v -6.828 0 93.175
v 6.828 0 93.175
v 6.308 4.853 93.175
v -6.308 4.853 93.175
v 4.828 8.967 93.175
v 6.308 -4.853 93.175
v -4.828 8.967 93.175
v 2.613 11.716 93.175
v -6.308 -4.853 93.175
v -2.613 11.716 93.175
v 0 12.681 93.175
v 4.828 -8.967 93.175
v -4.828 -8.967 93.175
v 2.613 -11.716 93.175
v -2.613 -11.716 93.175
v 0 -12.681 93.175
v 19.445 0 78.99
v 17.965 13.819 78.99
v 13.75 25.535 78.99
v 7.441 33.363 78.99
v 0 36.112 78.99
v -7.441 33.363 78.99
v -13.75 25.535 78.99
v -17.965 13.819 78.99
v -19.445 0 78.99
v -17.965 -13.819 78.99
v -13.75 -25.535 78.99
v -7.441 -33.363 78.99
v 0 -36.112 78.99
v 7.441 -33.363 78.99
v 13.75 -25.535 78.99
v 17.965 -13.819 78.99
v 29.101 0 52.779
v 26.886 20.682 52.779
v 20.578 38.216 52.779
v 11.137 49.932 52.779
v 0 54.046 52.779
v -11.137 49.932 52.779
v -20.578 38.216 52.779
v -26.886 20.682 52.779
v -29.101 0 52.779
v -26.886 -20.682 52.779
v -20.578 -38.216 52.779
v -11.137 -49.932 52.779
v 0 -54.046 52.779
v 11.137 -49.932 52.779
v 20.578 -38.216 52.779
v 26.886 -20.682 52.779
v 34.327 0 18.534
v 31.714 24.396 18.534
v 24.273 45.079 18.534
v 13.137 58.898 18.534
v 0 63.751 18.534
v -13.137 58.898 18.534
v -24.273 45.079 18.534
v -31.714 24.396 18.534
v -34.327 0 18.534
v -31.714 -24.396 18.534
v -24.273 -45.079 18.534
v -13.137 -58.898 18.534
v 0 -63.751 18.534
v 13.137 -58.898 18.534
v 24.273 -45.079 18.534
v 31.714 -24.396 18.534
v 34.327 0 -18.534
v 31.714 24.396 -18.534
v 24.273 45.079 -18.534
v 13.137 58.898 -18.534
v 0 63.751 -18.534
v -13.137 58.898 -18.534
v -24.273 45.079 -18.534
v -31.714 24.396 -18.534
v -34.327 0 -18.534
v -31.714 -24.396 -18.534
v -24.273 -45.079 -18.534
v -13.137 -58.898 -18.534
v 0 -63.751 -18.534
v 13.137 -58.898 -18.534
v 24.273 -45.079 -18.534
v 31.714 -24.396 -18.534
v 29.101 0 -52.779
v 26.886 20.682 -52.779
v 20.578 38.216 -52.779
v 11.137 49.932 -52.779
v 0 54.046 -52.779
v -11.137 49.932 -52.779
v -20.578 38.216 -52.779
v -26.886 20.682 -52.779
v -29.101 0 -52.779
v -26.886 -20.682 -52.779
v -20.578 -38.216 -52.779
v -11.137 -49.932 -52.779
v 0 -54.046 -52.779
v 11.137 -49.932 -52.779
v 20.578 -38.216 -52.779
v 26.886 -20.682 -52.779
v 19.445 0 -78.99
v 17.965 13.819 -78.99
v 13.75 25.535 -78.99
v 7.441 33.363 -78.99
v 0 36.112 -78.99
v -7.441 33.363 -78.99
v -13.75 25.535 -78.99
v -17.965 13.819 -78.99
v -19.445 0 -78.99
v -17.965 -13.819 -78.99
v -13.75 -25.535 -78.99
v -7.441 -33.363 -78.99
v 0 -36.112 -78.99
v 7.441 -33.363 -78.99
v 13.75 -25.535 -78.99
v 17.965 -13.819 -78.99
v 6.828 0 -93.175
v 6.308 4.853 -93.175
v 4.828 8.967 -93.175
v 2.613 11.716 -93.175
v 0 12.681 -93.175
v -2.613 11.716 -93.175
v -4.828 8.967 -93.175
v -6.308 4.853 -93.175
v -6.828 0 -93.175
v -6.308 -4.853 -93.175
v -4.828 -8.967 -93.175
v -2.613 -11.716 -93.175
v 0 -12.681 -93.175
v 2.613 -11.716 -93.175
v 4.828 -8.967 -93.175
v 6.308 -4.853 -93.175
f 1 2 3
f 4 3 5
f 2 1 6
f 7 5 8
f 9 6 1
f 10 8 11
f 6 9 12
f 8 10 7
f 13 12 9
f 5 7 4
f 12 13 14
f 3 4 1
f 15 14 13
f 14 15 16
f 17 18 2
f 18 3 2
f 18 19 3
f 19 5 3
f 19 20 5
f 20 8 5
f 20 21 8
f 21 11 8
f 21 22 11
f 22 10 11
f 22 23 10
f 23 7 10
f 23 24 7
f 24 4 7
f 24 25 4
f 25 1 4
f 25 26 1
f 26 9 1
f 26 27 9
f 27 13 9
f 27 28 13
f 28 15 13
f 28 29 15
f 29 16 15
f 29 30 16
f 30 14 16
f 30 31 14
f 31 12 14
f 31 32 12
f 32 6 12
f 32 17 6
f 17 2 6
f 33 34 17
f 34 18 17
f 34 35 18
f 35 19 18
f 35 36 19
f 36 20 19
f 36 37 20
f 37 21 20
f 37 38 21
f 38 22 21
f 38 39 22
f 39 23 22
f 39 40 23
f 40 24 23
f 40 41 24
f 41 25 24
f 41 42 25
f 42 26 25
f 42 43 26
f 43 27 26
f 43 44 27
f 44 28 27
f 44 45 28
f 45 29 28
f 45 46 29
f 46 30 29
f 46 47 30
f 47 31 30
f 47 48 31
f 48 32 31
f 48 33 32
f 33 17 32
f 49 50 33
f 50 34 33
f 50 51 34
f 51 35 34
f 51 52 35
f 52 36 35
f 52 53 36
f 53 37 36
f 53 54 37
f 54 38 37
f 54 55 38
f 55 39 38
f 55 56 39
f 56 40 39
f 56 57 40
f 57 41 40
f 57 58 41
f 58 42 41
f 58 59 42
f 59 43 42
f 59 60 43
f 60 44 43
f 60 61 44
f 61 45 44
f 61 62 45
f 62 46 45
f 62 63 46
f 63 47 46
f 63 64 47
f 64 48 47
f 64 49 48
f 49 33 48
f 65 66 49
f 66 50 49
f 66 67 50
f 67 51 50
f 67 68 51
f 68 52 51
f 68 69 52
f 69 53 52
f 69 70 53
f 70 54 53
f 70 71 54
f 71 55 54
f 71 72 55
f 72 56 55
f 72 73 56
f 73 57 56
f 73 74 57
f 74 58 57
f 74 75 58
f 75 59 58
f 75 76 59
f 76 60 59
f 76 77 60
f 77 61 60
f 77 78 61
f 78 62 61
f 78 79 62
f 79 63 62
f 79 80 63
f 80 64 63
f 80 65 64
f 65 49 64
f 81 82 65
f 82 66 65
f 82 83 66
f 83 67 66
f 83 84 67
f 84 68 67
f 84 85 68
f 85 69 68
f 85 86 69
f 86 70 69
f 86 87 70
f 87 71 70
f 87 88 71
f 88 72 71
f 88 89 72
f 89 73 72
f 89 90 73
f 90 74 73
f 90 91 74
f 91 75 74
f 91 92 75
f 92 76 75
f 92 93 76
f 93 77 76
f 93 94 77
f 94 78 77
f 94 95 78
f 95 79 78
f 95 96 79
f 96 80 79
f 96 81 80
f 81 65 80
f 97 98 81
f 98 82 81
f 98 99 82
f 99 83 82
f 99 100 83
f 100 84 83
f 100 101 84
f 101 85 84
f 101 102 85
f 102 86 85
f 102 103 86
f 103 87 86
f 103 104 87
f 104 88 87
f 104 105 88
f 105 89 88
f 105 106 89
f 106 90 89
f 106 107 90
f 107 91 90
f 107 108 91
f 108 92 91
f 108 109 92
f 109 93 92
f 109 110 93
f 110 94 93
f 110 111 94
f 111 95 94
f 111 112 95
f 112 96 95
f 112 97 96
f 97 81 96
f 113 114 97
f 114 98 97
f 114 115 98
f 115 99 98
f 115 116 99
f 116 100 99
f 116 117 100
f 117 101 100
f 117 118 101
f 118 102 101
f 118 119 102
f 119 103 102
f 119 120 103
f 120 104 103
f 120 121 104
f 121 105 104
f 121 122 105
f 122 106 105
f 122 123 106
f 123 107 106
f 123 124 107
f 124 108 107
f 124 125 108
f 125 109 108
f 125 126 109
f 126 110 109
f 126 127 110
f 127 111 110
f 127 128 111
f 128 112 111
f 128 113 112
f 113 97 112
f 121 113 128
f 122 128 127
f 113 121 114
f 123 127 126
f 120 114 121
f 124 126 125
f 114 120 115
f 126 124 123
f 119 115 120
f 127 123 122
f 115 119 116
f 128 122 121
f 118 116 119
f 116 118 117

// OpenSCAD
// Generated by SolidPython 1.0.1 on 2020-07-29 00:46:47


scale(v = [7, 13, 19]) {
	sphere(r = 5);
}
/***********************************************
*********      SolidPython code:      **********
************************************************
 
# import packages: SolidPython
from solid import *
from solid.utils import *
from itertools import chain, combinations, permutations


class Resize:

    def __init__(self, scad_file):
        self.scad_file = scad_file
        #self.scad_file = import_scad(scad_file)
        # cone/cylinder param:
        self.r1 = 0
        self.r2 = 0
        self.h = 0
        # rectangular prism param:
        self.w = 0
        self.l = 0
        # ellipse param:
        self.r = 0

    # import OpenScad code (file name corresponds to shape)


    # classify shape + parameters
    def assign(self, param1, param2, param3):
        if self.scad_file == 'cone.scad':
            self.r1 = param1
            self.r2 = param2
            self.h = param3
        elif self.scad_file == 'cylinder.scad':
            self.r1 = param1
            self.r2 = param2
            self.h = param3
        elif self.scad_file == 'rectangularPrism.scad':
            self.h = param1
            self.l = param2
            self.w = param3
        else:
            self.r = param1
            self.h = param2

    # resize parameters
    def iterate(self):
        x = range(3, 20, 2)
        i = 1
        if self.scad_file == 'cone.scad':
            tempList = list(permutations(x, 2))
            for temp in tempList:
                param1 = temp[0]
                param2 = temp[1]
                filepath = 'produced_scad_files/' + 'cone' + str(param1) + '_' + str(param2) + '_' + '.scad'
                scad_render_to_file(cylinder(h=param1, r1=param2, r2=0), filepath)

        elif self.scad_file == 'cylinder.scad':
            tempList = list(permutations(x, 3))
            for temp in tempList:
                param1 = temp[0]
                param2 = temp[1]
                filepath = 'produced_scad_files/' + 'cylinder' + str(param1) + '_' + str(param2) + '_' + '.scad'
                scad_render_to_file(cylinder(h=param1, r1=param2, r2=param2), filepath)

        elif self.scad_file == 'rectangularPrism.scad':
            tempList = list(permutations(x, 3))
            for temp in tempList:
                param1 = temp[0]
                param2 = temp[1]
                param3 = temp[2]
                filepath = 'produced_scad_files/' + 'rectangularPrism' + str(param1) + '_' + str(param2) + '_' + str(
                    param3) + '.scad'
                scad_render_to_file(cube(size=(param1, param2, param3)), filepath)

        elif self.scad_file == 'ellipse.scad':
            tempList = list(permutations(x, 4))
            for temp in tempList:
                param1 = temp[0]
                param2 = temp[1]
                param3 = temp[2]
                param4 = temp[3]
                filepath = 'produced_scad_files/' + 'ellipse' + str(param1) + '_' + str(param2) + '_' + str(param3) + '_' + str(param4) + '.scad'
                scad_render_to_file(scale([param1, param2, param3])(sphere(r=param4)), filepath)

    def render_to_scadfile(self):
        scad_render_to_file(scad, 'example.scad') 
 
************************************************/
